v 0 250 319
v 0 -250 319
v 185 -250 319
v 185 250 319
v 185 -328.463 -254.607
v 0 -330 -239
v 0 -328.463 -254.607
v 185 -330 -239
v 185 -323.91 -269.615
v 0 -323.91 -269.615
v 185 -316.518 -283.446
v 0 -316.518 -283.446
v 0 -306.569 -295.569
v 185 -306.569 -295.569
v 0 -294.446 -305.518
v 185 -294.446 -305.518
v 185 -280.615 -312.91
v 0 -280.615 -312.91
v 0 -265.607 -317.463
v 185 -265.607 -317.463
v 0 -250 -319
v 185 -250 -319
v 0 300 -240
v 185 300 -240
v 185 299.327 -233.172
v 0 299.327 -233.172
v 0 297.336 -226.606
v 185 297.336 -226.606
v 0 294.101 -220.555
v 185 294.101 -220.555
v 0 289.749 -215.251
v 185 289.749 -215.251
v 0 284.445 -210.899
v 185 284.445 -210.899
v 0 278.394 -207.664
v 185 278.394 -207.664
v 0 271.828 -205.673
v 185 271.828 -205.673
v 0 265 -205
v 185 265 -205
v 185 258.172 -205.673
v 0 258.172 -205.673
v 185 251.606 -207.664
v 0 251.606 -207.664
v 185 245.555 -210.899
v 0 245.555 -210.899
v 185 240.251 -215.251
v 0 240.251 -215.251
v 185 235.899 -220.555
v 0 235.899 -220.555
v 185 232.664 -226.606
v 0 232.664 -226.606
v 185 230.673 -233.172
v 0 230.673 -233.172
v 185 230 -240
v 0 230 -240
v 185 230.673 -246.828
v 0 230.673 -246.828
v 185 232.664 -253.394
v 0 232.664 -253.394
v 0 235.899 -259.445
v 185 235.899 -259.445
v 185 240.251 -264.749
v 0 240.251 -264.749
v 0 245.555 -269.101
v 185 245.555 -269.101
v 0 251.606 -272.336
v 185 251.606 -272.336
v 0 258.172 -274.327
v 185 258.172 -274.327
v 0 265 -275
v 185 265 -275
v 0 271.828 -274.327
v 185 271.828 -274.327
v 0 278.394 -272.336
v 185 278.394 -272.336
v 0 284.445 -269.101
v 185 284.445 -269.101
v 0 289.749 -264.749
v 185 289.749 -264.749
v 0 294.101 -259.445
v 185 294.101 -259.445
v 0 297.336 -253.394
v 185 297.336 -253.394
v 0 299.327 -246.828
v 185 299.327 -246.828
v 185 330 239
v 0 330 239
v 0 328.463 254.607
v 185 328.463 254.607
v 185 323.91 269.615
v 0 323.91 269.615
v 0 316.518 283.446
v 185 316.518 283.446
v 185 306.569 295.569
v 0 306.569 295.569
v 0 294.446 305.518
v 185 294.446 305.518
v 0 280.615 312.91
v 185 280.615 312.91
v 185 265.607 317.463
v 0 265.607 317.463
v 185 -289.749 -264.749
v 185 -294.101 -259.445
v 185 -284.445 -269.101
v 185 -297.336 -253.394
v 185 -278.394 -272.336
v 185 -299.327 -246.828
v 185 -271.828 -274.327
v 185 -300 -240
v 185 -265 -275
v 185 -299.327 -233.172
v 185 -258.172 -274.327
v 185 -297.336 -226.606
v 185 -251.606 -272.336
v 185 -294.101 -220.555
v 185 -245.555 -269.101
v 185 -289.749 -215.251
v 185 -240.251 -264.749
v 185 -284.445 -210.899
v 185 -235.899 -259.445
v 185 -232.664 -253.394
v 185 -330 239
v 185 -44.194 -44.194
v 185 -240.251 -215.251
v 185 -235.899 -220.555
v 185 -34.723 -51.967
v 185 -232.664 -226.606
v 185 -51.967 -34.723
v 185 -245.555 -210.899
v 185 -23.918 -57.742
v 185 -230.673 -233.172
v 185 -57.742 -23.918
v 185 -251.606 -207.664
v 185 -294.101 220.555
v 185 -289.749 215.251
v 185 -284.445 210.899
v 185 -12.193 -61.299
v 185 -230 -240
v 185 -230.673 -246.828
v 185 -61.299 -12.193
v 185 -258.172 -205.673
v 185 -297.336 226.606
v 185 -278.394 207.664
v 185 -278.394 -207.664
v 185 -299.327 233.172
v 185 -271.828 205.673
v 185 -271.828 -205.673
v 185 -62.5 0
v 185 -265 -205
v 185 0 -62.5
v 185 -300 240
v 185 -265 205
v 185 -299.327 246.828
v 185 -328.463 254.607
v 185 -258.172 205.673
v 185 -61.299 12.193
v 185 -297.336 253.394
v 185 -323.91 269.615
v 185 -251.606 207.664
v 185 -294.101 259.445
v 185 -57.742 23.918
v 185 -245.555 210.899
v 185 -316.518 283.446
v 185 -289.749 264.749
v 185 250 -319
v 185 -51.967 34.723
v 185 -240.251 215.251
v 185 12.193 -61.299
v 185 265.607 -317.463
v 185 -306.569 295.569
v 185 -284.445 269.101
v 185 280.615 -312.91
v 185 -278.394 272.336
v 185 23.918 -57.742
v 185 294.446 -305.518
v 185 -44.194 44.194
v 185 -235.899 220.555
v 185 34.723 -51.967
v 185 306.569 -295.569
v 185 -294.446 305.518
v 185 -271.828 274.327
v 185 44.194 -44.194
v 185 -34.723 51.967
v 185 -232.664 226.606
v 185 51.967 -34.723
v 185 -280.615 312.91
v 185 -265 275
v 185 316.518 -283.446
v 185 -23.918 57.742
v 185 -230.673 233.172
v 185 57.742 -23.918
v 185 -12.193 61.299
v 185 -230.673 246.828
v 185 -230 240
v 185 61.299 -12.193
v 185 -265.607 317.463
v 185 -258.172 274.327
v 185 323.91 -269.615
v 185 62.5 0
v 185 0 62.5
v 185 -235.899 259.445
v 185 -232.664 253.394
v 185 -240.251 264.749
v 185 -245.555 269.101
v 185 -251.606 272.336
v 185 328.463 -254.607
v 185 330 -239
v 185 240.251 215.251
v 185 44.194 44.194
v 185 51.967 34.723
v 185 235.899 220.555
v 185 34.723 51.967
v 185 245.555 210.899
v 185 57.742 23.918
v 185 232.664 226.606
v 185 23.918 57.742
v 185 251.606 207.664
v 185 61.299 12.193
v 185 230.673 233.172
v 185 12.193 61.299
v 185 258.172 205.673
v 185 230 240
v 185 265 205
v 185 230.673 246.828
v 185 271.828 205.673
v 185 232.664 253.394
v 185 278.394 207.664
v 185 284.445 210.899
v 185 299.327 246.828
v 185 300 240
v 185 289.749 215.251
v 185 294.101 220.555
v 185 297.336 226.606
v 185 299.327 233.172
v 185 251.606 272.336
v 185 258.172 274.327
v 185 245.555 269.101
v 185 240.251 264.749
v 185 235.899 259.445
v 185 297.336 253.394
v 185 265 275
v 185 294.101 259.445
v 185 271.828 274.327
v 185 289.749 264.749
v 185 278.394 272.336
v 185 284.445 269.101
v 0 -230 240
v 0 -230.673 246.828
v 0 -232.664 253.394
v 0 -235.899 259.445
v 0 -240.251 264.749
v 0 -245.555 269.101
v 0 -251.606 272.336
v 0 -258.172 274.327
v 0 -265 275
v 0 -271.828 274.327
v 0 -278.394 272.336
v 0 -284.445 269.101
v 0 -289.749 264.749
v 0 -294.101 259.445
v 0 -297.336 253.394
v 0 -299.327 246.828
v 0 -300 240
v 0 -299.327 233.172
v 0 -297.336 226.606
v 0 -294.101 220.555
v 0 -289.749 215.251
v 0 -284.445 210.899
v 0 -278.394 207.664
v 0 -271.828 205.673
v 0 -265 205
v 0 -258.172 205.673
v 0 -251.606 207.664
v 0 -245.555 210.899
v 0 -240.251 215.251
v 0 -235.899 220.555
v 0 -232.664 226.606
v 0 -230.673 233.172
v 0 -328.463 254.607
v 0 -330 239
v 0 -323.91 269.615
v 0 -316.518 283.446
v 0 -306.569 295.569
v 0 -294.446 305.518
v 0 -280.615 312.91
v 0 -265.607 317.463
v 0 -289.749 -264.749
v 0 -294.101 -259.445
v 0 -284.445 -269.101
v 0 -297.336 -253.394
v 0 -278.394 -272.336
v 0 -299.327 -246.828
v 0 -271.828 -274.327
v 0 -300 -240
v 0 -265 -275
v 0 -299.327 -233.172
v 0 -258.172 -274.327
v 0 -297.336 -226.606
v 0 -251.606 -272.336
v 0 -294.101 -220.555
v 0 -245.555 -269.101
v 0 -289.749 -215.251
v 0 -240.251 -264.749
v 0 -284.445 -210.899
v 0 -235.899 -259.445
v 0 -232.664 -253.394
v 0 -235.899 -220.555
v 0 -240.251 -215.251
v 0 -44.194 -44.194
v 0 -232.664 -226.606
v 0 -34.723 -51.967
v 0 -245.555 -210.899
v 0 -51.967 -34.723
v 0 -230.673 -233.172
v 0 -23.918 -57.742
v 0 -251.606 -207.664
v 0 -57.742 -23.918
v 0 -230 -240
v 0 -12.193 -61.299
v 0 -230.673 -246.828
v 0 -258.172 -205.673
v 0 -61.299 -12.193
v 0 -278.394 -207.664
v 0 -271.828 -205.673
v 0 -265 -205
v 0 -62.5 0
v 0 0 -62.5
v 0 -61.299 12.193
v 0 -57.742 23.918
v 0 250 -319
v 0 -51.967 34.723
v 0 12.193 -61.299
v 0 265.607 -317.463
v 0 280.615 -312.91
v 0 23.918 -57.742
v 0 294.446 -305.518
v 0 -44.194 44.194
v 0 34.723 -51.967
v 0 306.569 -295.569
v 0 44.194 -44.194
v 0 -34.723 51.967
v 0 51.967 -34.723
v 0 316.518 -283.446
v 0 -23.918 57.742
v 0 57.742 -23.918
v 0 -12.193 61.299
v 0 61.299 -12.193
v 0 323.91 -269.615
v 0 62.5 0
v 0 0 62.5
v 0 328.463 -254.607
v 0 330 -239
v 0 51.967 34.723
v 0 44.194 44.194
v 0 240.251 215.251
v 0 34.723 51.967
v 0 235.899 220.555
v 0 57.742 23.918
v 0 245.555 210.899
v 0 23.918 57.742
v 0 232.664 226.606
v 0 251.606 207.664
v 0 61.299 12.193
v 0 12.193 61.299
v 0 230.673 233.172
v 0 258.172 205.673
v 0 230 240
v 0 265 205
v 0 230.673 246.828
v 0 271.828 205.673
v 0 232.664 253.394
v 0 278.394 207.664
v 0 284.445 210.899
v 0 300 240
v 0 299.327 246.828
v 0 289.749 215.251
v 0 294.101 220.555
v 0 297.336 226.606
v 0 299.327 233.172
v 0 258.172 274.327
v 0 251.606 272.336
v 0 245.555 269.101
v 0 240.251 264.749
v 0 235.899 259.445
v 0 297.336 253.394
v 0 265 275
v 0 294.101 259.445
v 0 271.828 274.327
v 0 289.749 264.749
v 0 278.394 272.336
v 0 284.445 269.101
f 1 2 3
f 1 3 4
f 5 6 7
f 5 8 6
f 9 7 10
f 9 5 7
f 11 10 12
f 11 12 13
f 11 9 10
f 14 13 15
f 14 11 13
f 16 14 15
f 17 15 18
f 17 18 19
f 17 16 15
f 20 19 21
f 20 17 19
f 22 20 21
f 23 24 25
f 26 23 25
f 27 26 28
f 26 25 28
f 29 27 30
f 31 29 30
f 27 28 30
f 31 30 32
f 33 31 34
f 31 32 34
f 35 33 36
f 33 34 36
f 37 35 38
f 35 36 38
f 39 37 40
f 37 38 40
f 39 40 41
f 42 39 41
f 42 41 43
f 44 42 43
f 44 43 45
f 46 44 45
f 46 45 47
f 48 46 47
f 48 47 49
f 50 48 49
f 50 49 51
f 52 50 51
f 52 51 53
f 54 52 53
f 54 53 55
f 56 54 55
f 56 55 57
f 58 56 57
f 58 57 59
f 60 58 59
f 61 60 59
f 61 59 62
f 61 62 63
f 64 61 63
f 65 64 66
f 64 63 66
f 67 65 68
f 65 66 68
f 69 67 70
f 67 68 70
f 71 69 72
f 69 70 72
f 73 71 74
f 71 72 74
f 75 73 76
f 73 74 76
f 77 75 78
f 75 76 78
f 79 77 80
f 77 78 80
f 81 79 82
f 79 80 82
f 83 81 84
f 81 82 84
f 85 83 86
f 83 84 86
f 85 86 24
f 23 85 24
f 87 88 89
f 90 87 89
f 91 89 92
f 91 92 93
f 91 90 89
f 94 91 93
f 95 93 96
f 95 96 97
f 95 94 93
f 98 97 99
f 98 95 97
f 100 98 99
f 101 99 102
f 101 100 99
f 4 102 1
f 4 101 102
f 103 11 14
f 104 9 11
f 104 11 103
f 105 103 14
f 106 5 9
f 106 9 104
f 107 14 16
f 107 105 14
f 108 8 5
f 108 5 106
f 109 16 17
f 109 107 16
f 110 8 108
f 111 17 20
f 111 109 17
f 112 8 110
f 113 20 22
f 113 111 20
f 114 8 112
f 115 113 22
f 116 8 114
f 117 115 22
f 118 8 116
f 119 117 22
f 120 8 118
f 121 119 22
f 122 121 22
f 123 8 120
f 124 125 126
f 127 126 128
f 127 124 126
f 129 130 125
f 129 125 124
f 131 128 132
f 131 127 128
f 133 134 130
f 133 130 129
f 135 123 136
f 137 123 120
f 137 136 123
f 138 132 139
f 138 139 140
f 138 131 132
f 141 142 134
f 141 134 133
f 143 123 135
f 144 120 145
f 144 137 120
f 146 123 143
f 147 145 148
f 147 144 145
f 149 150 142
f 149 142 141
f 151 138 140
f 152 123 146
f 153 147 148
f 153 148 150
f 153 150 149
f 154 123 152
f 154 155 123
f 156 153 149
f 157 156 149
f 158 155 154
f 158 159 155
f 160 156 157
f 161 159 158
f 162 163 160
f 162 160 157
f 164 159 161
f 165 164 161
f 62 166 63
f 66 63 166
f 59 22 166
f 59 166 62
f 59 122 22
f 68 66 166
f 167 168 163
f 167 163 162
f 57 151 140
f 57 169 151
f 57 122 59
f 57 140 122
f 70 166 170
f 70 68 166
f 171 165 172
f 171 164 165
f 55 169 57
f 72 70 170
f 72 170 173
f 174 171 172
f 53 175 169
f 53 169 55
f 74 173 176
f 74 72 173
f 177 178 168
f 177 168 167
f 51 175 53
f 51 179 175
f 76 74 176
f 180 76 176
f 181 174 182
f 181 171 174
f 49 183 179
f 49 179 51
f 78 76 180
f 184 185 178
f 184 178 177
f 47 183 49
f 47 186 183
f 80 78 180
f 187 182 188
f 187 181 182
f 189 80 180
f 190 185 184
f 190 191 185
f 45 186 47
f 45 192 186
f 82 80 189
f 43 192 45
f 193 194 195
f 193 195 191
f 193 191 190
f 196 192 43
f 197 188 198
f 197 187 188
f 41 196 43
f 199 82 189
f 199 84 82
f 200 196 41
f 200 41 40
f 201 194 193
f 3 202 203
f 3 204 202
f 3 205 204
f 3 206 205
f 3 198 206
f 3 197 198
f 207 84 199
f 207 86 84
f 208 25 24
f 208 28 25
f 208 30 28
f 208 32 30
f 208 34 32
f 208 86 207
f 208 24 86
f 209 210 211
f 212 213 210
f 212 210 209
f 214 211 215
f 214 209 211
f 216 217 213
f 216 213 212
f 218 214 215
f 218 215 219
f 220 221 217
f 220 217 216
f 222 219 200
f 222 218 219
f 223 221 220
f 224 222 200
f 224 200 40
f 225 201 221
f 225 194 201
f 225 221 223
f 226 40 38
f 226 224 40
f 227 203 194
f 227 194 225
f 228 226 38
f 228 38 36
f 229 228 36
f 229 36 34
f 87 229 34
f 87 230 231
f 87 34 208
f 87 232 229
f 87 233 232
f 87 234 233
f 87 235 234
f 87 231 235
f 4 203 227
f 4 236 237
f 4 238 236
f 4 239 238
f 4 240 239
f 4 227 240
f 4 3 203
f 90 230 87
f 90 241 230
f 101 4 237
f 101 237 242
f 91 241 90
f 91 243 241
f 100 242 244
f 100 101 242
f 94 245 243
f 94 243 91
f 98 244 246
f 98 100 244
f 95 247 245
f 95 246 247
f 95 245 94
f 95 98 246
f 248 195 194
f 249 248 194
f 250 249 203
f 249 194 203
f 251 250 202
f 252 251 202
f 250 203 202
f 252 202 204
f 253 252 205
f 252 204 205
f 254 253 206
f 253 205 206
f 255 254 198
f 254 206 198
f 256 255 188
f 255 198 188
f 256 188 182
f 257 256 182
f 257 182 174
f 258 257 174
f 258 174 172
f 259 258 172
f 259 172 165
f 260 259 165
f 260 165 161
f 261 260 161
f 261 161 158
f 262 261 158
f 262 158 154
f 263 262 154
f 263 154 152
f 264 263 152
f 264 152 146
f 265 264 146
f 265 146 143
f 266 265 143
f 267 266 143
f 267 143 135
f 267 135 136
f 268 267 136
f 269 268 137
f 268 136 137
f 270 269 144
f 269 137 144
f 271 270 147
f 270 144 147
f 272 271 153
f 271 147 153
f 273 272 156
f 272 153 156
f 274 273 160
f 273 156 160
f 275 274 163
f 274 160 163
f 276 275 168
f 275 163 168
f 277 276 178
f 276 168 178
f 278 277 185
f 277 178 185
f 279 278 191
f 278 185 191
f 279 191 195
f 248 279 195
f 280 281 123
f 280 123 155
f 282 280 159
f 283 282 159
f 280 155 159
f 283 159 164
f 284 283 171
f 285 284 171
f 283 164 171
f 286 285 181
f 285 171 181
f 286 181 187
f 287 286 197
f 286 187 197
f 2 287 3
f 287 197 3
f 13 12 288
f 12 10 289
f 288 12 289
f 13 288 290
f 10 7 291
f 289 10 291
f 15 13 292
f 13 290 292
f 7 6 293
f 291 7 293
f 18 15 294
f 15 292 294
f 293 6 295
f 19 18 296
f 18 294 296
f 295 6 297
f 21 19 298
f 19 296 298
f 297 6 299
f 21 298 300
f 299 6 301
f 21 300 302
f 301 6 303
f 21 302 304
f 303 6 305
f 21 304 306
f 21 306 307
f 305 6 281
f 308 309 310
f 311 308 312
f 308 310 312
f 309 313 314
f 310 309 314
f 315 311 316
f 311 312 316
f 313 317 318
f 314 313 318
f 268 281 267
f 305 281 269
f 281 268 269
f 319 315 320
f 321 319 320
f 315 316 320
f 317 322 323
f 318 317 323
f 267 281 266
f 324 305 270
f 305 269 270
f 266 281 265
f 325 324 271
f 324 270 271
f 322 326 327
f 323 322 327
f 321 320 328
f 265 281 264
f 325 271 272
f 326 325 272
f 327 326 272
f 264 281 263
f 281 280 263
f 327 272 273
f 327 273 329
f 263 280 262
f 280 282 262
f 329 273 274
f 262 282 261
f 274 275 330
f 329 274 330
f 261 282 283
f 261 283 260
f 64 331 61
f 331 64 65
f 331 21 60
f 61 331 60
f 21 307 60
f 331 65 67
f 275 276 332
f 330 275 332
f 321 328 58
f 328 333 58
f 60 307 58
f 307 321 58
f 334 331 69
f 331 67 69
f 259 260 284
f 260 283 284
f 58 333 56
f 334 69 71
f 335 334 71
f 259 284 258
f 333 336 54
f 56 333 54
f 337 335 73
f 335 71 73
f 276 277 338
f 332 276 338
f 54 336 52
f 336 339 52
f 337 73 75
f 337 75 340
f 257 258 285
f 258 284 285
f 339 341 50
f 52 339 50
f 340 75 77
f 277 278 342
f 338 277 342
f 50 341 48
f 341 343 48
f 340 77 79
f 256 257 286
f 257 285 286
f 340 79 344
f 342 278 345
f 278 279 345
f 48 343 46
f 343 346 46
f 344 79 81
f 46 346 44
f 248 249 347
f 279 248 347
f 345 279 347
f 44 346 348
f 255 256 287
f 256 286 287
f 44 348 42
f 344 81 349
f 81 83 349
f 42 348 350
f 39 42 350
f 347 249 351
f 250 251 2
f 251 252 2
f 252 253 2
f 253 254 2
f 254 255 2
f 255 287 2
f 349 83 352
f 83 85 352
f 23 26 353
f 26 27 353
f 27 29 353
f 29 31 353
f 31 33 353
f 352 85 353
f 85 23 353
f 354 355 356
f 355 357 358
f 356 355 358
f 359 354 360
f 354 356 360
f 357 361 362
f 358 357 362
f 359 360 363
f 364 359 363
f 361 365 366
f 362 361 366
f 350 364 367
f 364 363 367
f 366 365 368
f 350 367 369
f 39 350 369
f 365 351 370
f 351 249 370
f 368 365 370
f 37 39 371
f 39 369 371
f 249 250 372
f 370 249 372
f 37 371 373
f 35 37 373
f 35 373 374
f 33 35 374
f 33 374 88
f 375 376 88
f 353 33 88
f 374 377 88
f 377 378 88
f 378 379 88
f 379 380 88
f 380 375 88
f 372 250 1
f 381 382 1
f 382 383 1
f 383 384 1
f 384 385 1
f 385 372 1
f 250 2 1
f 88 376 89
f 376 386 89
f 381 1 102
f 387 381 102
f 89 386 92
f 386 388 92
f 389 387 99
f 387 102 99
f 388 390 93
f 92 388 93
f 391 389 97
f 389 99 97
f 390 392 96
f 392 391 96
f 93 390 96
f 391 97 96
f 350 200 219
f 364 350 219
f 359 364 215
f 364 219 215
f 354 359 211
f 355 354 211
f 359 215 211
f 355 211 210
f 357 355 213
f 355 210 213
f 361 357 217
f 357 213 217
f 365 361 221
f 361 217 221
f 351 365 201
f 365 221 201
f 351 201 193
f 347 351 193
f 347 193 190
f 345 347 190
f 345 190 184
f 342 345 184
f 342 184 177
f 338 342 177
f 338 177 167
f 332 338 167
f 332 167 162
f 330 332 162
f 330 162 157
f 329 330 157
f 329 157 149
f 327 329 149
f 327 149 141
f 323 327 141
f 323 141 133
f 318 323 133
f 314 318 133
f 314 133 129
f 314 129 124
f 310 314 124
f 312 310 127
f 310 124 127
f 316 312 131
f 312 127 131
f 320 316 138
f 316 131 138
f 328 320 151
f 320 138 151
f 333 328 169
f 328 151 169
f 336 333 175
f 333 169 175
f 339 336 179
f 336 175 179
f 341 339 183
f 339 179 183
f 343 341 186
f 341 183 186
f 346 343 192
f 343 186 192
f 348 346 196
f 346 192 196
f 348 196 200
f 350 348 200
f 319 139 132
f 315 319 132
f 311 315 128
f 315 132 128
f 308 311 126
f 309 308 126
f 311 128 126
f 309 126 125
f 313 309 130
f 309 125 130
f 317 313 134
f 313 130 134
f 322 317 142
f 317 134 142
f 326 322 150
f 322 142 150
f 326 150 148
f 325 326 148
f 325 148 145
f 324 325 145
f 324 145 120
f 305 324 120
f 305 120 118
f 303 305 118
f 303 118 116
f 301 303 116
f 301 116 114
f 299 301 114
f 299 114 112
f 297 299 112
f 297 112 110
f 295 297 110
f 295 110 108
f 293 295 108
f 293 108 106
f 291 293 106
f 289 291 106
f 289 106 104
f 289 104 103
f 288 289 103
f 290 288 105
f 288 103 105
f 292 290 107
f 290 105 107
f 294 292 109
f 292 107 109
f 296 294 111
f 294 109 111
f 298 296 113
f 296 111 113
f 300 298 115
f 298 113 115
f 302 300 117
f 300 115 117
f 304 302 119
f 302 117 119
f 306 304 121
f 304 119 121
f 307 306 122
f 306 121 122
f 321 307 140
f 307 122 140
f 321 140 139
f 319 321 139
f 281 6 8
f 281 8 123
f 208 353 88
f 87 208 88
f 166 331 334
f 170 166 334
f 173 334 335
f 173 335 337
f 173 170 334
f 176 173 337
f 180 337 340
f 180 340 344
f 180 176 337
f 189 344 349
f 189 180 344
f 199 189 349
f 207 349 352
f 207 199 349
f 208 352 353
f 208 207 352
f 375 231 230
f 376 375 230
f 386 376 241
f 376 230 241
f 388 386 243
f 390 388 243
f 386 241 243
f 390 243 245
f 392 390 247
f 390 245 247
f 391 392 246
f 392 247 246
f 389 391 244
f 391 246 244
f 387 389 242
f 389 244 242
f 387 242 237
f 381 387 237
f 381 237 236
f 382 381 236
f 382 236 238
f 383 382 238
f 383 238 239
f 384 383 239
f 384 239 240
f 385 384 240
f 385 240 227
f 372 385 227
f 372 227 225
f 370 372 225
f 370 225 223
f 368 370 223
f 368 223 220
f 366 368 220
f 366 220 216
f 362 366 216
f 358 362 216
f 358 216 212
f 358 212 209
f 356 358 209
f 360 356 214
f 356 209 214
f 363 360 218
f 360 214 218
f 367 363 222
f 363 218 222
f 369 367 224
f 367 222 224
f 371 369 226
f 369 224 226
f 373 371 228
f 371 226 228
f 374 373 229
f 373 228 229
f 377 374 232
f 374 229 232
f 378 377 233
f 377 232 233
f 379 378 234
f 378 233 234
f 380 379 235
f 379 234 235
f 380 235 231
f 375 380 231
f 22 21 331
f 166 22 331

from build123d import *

# Parameters (mm, degrees)
F0_W     = 660
F0_H     = 638
F1_DEPTH = 185
F2_R     = 80
F3_R     = 62.5
F4_DEPTH = 185.001
F5_R     = 35
F6_DEPTH = 185.001


with BuildPart() as f1:
    # F0 (on Right) → F1 (new body)
    with BuildSketch(Plane.YZ):
        Rectangle(F0_W, F0_H)
    extrude(amount=F1_DEPTH)

    # F2
    f2_edges = [f1.edges().sort_by_distance(p)[0] for p in [
        (92.5, 330, 319),
        (92.5, -330, 319),
        (92.5, 330, -319),
        (92.5, -330, -319),
    ]]
    fillet(f2_edges, radius=F2_R)

    # F3 (on face) → F4 (cut, through all)
    with BuildSketch(Plane.YZ.offset(185)):
        Circle(F3_R)
    extrude(amount=-F4_DEPTH, mode=Mode.SUBTRACT)

    # F5 (on face) → F6 (cut, through all)
    with BuildSketch(Plane.YZ.offset(185)):
        with Locations((-265, 240)):
            Circle(F5_R)
        with Locations((265, 240)):
            Circle(F5_R)
        with Locations((265, -240)):
            Circle(F5_R)
        with Locations((-265, -240)):
            Circle(F5_R)
    extrude(amount=-F6_DEPTH, mode=Mode.SUBTRACT)


solid = f1.part
